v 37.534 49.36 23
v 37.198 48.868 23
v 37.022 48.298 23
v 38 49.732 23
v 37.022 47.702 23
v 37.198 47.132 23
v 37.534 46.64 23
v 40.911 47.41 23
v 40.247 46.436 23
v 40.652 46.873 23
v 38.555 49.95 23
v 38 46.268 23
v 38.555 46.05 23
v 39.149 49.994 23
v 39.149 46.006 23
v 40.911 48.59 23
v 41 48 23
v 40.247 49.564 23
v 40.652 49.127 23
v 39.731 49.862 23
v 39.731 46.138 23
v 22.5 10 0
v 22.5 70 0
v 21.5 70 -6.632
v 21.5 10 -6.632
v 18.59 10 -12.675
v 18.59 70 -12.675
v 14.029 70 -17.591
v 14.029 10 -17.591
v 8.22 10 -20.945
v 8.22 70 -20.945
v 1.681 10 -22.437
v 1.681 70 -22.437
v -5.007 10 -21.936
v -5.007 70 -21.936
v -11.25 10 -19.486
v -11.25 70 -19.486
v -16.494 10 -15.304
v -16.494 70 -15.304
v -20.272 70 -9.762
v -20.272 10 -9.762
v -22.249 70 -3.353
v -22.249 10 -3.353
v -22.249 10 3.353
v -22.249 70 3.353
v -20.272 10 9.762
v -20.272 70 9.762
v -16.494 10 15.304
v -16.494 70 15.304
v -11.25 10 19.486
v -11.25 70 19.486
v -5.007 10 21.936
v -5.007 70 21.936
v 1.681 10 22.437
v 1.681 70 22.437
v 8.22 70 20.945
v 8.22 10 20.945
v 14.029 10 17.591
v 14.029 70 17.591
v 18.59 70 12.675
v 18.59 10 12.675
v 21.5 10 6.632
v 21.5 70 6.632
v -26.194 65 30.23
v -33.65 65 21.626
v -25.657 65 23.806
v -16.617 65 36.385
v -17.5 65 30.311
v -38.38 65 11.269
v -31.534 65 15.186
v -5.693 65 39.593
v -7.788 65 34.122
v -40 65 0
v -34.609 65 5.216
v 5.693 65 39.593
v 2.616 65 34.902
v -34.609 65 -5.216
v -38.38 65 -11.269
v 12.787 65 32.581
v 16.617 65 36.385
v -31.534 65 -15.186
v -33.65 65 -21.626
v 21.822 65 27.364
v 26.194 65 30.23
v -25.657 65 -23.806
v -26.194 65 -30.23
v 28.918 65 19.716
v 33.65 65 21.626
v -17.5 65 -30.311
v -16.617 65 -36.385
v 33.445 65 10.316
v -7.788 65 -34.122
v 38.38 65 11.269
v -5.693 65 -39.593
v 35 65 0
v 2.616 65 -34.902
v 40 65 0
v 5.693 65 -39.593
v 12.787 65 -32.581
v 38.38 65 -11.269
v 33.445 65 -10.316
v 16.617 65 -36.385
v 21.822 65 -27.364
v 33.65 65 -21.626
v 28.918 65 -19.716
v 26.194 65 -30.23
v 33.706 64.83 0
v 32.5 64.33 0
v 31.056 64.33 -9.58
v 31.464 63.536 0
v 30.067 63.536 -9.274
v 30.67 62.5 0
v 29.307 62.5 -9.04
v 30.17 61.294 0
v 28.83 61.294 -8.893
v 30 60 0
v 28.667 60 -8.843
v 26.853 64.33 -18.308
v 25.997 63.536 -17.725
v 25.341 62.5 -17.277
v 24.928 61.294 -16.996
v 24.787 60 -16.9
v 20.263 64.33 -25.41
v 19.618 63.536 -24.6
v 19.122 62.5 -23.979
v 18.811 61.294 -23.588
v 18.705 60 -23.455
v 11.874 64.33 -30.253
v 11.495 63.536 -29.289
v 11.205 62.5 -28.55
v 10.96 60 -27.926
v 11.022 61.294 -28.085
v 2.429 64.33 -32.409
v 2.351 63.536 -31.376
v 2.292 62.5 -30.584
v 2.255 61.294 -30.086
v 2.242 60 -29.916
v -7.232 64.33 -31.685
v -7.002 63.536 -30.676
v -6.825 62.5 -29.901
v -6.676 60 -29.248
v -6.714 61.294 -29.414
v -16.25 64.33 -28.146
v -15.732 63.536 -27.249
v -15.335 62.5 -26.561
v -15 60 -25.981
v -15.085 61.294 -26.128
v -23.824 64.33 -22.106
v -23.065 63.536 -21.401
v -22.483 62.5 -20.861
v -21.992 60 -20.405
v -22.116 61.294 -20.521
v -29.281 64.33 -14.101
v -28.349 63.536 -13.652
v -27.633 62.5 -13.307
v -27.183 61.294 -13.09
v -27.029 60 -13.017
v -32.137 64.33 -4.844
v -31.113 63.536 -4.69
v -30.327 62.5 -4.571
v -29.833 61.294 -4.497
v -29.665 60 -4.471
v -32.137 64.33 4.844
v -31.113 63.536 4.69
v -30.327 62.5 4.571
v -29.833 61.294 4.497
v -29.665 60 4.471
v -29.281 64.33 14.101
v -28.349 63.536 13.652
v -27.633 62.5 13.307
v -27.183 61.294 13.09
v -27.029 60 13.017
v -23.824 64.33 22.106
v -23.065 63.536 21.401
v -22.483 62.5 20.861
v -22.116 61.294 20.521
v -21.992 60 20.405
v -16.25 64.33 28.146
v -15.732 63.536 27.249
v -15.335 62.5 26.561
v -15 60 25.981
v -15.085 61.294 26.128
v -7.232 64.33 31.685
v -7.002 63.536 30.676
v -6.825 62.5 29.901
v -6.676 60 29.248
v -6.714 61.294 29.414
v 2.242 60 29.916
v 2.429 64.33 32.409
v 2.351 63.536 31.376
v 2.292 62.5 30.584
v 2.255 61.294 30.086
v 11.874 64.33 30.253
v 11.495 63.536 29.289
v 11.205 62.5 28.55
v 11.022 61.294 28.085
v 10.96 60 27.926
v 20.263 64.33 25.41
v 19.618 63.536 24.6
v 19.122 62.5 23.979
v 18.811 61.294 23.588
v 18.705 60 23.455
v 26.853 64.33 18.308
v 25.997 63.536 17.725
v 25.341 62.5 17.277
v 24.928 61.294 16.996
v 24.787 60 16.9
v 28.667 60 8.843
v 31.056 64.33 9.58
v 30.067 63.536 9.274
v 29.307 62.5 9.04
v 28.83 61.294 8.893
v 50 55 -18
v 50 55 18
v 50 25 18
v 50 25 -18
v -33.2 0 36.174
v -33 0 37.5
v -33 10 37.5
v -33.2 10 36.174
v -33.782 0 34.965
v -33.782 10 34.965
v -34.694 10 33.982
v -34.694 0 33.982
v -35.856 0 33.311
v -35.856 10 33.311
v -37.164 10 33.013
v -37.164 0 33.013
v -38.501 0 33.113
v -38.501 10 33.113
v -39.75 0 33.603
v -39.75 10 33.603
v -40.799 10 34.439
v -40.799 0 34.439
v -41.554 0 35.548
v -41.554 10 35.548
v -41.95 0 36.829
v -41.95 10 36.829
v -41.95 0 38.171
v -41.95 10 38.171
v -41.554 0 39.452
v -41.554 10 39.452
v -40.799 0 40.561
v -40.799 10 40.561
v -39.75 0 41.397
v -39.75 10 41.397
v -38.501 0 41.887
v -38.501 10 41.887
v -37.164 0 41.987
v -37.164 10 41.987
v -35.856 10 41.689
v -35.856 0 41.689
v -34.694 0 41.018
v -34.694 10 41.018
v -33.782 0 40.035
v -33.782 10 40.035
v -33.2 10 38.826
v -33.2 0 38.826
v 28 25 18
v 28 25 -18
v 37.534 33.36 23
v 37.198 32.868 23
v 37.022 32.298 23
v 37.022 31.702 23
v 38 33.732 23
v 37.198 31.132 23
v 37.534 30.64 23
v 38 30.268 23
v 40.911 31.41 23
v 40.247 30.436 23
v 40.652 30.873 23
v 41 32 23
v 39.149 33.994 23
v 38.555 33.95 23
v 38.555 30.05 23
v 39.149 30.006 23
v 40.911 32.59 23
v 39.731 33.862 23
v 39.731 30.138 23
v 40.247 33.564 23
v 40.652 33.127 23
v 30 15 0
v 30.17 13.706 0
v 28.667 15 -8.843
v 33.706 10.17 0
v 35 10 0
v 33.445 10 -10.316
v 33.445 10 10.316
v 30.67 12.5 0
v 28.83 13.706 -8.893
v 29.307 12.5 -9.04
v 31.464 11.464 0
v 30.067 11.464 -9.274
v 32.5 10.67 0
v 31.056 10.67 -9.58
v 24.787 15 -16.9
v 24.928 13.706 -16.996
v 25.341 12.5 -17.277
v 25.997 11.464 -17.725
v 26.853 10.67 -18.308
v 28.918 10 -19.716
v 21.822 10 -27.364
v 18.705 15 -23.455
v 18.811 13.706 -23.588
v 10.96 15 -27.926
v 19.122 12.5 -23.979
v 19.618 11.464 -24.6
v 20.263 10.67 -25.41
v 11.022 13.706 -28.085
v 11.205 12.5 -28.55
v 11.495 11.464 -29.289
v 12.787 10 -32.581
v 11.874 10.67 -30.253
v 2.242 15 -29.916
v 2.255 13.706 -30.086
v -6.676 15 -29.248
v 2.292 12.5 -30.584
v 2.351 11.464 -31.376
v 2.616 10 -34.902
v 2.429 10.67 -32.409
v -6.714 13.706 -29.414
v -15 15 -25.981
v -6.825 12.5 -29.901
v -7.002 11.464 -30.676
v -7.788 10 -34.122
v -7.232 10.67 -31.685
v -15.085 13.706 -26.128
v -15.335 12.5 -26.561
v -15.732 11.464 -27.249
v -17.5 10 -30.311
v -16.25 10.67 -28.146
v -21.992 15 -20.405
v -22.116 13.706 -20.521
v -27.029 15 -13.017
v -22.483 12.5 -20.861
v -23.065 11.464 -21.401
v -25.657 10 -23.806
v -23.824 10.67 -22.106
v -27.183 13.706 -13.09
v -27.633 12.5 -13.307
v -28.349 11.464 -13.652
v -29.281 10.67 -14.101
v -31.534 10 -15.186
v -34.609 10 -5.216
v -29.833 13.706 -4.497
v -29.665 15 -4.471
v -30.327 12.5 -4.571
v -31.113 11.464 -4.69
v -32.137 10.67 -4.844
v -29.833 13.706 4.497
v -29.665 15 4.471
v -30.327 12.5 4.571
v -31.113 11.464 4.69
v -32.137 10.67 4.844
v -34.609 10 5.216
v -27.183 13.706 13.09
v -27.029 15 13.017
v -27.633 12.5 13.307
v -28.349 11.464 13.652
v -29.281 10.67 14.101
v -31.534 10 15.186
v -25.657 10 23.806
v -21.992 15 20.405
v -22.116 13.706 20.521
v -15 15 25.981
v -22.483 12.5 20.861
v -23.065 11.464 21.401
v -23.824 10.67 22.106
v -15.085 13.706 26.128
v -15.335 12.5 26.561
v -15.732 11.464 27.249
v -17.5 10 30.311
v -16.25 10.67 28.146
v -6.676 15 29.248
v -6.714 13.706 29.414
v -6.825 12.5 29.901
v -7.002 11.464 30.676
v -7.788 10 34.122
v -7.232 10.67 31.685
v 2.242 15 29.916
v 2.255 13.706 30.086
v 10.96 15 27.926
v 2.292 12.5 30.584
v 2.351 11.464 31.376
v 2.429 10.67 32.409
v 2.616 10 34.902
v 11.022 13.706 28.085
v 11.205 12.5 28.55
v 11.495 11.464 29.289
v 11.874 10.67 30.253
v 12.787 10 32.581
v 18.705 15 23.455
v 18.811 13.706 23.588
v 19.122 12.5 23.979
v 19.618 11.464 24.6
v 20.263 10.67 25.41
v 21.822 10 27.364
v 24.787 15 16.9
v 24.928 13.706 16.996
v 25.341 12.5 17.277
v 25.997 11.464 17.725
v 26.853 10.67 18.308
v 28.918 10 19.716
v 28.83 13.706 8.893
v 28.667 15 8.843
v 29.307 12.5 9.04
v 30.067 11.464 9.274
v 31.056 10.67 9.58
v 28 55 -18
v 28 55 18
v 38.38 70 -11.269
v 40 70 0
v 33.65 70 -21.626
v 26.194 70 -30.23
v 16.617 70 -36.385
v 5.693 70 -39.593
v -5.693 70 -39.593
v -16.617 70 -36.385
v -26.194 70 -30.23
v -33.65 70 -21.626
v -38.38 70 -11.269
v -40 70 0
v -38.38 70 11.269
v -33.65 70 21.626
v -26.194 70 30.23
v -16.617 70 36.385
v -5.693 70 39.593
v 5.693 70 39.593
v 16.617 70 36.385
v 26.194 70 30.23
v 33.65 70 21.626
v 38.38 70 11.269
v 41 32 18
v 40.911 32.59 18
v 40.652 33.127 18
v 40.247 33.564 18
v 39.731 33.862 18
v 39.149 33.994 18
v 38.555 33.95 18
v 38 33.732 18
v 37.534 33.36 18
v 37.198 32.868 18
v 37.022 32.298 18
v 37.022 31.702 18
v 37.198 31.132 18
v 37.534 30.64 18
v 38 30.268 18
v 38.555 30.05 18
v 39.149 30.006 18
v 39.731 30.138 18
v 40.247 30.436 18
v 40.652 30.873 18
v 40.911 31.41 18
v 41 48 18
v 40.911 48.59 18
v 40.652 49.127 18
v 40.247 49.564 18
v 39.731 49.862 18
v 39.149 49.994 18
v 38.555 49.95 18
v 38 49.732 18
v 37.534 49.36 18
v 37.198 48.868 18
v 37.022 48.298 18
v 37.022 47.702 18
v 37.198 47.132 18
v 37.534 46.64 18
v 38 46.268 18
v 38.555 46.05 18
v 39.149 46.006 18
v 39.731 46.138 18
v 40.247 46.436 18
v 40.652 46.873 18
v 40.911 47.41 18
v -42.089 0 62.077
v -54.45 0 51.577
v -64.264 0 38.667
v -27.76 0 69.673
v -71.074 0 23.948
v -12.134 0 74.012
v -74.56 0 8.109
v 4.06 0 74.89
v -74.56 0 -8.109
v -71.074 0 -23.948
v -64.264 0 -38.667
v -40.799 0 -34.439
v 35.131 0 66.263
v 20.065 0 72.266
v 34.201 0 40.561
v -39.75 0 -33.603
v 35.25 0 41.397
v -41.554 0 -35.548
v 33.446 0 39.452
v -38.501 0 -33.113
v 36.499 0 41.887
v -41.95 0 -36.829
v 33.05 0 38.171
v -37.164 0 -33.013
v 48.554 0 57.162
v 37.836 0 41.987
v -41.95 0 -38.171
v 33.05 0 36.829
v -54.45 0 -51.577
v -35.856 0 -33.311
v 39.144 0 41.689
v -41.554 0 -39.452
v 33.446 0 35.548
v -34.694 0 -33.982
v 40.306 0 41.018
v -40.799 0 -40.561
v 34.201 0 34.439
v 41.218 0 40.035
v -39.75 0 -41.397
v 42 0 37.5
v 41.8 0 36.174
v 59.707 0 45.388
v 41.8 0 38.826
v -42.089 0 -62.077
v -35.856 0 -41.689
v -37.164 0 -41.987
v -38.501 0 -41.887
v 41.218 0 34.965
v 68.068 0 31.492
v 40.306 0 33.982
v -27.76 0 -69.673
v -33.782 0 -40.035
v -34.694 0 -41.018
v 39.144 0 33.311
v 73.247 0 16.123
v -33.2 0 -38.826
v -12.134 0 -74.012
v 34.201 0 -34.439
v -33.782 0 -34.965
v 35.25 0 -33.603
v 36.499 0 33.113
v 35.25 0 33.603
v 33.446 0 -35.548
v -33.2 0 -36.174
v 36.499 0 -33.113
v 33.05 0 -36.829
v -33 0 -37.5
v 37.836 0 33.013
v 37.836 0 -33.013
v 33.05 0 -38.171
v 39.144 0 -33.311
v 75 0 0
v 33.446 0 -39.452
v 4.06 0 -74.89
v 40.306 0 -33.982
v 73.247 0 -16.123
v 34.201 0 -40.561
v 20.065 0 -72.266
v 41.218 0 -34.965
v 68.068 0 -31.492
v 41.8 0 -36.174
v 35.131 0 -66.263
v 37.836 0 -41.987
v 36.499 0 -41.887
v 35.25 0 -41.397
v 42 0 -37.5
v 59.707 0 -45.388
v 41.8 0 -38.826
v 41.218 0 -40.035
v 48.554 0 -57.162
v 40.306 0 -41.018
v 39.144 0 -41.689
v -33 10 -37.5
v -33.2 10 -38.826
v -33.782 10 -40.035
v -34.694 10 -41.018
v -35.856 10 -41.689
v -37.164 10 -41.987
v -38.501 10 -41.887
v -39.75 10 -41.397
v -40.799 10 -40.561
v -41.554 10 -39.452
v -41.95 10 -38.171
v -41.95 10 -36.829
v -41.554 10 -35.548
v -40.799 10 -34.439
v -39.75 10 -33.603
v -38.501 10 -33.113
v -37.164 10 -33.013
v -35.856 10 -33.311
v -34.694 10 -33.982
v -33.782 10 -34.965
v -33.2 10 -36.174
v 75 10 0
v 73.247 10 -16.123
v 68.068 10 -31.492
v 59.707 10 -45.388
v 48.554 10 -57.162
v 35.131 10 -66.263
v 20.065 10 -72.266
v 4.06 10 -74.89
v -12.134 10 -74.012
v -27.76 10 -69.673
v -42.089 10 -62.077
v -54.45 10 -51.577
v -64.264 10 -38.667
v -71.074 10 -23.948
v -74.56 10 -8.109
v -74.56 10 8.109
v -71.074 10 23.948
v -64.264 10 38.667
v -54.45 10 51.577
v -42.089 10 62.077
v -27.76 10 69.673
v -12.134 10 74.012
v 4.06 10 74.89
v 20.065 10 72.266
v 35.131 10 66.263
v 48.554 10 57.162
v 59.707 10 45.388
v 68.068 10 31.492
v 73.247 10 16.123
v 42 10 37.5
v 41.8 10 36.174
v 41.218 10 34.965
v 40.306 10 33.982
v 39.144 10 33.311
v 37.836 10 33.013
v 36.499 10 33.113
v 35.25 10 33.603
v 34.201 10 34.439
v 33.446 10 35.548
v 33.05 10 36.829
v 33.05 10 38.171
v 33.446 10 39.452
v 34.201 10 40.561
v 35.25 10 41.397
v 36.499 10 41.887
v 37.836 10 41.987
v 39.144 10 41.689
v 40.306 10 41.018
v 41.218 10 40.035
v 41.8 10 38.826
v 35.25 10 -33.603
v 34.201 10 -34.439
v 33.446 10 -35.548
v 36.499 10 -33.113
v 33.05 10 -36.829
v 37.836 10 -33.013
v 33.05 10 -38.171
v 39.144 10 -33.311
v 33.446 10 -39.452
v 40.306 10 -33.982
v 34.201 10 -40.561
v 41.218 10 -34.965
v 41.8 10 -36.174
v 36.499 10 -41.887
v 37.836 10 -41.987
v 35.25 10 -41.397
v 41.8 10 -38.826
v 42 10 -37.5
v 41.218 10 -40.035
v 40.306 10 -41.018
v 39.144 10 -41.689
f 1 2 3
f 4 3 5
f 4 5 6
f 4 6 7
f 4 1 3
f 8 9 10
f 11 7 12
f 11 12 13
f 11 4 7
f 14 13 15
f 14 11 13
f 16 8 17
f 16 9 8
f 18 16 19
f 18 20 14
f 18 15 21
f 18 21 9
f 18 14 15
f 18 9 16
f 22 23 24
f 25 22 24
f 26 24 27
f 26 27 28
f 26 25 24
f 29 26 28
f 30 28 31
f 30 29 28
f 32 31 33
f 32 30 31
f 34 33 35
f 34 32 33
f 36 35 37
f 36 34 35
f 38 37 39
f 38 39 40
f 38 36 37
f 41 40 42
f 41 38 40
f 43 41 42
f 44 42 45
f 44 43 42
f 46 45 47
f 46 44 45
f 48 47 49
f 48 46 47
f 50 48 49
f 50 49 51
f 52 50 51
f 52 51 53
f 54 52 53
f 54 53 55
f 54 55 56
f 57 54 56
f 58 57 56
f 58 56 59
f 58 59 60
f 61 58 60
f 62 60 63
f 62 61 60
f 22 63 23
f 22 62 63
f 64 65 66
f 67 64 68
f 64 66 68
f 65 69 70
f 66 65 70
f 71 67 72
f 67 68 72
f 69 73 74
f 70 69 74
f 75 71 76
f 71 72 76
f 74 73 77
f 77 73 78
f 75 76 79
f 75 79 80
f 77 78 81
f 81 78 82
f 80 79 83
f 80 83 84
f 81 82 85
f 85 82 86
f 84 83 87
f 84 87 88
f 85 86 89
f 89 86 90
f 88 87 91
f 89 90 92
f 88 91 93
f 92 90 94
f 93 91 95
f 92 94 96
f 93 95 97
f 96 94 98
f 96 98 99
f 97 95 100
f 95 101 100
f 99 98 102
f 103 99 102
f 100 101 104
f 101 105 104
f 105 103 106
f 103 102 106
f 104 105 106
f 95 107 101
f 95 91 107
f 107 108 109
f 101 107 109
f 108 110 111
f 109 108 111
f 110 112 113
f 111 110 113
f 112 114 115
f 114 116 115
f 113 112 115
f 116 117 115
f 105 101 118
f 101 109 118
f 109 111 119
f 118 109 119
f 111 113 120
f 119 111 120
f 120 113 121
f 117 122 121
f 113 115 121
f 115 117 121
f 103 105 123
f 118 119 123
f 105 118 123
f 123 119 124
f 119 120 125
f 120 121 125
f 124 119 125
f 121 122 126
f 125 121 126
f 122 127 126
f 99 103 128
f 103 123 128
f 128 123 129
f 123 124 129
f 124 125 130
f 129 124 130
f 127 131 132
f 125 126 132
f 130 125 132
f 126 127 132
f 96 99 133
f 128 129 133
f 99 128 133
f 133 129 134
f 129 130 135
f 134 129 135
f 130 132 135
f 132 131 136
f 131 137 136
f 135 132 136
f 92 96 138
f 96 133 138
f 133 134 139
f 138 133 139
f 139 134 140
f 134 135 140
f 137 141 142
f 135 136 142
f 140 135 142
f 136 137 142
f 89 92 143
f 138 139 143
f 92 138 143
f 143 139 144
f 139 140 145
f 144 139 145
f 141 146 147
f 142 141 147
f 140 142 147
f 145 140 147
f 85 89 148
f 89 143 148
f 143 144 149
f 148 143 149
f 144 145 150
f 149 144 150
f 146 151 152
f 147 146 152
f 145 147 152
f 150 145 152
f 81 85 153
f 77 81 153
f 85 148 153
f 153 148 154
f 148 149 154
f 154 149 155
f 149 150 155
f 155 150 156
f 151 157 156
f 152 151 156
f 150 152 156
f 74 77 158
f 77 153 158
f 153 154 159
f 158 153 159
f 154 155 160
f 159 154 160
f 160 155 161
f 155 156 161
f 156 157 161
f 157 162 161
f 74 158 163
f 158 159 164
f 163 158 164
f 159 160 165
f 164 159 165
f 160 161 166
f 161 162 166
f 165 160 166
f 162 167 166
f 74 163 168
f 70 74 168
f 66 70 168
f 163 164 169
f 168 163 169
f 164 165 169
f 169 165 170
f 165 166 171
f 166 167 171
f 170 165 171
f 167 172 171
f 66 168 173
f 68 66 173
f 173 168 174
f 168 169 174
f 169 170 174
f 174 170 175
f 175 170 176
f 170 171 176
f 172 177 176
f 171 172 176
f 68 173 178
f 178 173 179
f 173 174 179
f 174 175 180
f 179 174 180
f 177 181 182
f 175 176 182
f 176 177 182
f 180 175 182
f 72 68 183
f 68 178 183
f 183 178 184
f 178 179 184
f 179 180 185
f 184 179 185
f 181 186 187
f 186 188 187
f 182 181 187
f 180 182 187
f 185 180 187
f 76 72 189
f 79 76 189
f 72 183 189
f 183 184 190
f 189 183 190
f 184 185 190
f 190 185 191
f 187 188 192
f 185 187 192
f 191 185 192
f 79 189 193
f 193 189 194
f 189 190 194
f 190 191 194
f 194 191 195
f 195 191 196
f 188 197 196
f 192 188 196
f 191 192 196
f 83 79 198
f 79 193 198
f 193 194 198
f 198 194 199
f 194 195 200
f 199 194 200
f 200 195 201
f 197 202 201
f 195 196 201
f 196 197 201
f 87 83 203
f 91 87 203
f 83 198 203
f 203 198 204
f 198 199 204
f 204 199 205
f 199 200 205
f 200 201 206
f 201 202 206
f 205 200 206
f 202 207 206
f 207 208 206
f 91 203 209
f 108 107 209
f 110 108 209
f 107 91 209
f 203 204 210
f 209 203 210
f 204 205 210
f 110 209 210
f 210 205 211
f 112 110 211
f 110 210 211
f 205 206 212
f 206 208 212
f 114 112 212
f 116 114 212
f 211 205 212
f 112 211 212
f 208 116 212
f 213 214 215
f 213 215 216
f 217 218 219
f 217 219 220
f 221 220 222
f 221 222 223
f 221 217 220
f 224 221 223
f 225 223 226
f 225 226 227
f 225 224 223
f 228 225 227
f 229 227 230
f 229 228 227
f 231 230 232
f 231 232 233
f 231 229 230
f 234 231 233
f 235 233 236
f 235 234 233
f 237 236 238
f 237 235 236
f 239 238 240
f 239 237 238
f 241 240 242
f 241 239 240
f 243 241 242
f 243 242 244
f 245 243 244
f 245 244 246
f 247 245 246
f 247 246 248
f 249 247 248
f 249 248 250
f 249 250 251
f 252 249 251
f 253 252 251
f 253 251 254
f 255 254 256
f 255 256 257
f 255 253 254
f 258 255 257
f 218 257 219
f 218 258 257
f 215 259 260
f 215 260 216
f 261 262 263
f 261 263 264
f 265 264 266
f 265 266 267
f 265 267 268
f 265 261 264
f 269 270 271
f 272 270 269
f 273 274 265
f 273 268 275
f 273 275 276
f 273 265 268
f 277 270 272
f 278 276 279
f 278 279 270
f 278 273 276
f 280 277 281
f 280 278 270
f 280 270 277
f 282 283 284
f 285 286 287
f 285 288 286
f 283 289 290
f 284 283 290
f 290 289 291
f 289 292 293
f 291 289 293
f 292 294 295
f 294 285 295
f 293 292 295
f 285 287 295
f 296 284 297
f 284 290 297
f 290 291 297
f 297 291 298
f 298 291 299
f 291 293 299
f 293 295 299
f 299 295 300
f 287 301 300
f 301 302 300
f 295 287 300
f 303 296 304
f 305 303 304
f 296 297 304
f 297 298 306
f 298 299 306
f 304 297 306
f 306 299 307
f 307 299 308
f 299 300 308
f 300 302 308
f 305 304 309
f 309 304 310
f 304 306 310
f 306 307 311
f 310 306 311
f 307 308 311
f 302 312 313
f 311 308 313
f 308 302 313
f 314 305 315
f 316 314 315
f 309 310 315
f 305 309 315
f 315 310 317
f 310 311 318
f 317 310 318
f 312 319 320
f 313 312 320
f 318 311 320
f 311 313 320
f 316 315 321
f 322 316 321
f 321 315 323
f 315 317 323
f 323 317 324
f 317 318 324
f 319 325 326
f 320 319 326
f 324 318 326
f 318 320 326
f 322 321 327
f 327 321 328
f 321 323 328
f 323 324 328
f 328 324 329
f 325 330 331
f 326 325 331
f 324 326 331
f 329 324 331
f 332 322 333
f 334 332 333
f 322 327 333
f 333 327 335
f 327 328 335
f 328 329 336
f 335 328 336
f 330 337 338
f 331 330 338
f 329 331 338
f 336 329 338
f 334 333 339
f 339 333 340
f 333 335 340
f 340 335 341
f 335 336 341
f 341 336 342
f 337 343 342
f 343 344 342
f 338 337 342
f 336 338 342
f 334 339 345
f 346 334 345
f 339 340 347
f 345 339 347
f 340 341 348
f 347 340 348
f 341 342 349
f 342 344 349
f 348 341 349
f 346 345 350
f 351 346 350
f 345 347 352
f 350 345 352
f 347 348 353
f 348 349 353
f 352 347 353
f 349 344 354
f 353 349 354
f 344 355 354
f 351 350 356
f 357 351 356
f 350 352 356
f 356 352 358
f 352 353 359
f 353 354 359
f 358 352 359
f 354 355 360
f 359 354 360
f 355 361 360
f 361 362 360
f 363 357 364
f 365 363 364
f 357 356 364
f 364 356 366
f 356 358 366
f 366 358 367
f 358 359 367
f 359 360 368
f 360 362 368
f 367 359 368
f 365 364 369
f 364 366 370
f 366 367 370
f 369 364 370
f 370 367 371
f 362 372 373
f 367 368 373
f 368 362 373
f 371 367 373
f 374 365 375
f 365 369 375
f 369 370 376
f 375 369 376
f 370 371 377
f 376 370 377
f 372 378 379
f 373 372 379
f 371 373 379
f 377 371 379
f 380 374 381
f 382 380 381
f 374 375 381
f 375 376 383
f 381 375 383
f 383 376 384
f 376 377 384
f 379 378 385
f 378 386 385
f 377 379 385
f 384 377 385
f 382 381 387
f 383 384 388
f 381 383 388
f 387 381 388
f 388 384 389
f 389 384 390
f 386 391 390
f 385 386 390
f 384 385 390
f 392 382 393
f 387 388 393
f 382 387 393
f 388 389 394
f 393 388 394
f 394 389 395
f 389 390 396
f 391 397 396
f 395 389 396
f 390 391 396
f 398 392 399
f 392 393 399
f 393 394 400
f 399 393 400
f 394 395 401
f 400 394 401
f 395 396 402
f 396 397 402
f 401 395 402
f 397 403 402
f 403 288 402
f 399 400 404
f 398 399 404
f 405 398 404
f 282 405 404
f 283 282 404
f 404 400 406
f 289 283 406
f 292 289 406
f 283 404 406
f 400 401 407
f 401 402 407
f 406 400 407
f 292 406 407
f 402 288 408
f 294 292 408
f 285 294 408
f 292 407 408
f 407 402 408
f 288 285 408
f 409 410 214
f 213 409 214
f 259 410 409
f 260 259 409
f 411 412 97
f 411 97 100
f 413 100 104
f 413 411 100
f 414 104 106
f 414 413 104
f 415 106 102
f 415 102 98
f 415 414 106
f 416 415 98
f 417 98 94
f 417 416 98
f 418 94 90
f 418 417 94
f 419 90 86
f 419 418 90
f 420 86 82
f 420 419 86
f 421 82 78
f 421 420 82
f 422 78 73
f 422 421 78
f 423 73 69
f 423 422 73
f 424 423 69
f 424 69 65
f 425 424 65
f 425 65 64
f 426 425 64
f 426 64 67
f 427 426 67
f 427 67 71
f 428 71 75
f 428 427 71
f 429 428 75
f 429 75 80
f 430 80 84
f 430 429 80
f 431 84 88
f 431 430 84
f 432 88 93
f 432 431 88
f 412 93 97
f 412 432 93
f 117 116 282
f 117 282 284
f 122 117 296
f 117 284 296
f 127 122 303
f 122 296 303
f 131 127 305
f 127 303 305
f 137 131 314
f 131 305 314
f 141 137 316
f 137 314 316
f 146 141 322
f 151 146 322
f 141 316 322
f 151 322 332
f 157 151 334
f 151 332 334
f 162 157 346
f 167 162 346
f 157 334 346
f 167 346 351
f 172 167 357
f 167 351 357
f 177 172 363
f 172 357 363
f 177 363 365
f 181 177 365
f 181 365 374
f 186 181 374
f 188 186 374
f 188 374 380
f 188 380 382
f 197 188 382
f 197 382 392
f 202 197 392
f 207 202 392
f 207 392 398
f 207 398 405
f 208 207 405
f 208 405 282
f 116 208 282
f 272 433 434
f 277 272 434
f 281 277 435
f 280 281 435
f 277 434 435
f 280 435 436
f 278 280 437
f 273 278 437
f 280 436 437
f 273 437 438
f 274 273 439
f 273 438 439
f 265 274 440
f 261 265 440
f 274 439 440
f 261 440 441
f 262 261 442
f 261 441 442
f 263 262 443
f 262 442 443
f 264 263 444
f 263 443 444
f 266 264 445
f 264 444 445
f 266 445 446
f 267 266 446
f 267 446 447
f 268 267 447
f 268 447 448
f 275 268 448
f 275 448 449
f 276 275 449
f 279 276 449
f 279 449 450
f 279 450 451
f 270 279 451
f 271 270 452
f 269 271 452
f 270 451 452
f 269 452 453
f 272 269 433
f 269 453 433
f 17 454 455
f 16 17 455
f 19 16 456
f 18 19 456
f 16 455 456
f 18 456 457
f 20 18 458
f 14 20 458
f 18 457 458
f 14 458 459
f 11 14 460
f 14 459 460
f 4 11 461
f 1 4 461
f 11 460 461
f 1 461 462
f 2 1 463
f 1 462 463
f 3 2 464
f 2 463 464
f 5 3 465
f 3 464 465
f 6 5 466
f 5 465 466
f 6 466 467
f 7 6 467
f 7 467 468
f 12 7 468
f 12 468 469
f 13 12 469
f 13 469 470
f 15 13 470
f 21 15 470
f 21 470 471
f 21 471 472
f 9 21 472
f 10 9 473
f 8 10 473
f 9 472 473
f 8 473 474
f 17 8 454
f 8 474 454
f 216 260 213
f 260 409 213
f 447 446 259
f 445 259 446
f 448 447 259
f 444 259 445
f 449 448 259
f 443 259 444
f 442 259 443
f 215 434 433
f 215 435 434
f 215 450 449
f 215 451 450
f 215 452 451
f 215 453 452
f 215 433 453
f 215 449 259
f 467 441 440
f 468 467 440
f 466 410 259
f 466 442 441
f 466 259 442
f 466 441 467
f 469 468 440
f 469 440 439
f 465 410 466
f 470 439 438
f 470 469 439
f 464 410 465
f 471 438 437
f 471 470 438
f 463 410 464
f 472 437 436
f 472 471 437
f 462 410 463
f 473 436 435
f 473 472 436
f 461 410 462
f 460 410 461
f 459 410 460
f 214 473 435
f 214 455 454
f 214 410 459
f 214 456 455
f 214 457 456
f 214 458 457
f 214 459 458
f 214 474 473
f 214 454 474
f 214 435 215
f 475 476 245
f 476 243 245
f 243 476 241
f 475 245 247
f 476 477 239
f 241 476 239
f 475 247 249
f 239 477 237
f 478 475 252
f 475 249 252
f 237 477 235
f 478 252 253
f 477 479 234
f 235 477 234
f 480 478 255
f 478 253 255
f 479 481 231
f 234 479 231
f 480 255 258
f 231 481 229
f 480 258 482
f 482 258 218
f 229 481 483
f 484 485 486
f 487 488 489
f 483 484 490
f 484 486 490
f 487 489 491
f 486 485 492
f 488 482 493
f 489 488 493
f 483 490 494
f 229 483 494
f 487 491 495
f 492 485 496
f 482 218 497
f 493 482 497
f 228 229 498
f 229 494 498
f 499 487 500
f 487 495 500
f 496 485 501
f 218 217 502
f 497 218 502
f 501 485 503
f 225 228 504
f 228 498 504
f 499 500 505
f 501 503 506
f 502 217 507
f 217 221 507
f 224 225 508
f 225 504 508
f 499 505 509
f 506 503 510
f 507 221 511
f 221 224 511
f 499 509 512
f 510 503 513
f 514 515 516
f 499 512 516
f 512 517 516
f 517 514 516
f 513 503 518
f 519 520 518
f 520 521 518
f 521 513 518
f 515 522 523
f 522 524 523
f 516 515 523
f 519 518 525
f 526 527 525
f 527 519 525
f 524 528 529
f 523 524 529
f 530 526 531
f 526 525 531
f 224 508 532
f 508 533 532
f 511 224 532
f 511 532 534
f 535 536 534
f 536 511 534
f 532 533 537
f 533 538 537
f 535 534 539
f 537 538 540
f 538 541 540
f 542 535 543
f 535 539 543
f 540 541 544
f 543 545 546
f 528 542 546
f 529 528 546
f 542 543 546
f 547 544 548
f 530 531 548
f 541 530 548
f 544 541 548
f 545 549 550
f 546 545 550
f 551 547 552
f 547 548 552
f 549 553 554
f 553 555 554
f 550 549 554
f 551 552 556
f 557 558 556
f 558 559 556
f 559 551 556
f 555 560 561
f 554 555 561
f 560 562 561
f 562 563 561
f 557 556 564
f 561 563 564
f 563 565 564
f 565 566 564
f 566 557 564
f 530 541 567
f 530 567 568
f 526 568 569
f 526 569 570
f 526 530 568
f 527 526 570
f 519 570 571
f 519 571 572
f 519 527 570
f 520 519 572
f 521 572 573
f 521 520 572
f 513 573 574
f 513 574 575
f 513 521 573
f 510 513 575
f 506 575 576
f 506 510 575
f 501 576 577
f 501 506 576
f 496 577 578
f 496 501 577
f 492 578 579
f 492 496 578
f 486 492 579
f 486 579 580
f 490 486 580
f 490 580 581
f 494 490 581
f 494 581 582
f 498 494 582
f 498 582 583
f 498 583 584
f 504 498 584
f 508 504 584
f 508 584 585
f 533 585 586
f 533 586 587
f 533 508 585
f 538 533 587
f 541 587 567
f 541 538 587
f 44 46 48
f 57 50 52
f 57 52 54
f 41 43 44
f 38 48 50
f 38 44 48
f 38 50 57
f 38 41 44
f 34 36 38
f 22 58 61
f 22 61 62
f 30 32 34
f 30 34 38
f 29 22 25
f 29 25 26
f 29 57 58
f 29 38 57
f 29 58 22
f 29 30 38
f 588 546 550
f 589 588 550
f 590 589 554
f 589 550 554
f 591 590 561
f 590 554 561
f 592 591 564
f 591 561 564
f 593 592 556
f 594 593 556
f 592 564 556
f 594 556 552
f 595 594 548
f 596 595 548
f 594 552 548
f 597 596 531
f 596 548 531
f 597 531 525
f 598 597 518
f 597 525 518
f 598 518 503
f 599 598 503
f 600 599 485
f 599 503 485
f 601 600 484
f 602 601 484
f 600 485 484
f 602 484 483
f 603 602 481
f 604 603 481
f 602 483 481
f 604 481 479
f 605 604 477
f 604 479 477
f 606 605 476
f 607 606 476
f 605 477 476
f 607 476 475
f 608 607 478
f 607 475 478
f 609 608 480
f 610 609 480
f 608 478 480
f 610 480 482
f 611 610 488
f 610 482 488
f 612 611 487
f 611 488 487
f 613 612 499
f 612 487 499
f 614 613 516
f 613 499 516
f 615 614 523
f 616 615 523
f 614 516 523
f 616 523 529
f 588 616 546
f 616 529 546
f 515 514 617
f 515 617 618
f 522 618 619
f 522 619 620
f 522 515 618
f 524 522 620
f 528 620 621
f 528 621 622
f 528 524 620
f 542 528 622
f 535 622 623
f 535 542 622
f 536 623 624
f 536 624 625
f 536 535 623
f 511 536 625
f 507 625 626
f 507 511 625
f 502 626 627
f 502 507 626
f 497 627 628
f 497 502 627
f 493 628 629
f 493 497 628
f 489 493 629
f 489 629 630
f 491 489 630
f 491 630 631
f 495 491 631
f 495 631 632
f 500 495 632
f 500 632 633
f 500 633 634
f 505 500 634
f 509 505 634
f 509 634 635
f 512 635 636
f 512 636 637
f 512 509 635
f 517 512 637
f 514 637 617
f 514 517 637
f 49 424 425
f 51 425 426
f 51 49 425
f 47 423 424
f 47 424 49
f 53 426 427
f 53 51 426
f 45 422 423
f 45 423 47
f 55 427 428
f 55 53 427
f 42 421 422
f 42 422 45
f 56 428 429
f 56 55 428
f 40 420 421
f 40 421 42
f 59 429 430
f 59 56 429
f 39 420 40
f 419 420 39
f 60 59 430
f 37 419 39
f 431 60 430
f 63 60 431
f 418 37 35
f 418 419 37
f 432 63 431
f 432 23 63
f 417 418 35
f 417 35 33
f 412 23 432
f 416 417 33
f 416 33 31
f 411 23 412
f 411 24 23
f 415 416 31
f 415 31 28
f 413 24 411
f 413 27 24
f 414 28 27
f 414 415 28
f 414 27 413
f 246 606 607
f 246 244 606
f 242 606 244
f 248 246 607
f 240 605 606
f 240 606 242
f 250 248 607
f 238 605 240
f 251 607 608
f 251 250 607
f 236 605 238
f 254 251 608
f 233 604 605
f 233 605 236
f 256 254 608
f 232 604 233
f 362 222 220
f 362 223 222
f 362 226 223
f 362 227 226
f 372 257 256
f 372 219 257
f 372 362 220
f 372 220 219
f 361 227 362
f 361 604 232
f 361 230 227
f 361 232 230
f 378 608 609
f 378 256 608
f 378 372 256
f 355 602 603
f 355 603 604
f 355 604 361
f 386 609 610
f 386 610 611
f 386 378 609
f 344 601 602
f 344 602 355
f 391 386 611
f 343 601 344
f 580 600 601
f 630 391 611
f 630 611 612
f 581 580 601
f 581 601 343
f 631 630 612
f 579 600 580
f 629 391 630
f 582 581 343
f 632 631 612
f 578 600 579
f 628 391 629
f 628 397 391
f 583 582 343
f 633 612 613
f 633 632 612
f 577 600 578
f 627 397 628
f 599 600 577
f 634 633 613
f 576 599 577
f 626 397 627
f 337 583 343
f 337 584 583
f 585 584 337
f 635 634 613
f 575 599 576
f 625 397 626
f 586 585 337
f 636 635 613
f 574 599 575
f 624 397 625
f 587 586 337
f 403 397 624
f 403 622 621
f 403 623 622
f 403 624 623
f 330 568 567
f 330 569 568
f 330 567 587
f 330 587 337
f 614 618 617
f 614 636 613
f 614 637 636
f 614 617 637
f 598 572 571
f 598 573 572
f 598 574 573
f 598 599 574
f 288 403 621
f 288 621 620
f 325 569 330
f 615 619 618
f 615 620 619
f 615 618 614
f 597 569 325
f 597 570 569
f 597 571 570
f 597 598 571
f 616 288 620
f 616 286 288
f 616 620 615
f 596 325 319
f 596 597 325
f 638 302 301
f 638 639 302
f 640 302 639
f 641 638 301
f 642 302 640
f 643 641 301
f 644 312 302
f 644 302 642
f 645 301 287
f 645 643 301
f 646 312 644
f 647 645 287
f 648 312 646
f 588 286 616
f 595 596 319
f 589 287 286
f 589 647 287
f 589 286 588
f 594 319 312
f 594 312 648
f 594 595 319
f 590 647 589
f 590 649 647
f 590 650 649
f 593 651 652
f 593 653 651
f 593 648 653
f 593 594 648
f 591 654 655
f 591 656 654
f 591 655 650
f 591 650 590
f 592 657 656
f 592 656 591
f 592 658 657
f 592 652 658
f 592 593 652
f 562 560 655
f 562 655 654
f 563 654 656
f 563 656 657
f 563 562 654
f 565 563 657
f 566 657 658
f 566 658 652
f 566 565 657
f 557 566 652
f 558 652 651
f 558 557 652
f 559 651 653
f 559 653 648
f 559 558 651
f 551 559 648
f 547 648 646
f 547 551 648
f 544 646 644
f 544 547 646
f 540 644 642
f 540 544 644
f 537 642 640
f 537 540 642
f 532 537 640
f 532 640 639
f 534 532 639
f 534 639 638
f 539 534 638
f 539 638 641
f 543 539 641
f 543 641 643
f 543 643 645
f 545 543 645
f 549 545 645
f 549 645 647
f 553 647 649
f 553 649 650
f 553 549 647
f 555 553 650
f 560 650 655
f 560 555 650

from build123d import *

# Parameters (mm, degrees)
IZIM1_W                     = 100
IZIM1_H                     = 100
IZIM1_R                     = 4.5
Y_KSEKLIK_EKSTR_ZYON1_DEPTH = 10
IZIM3_R                     = 30
IZIM3_R_2                   = 22.5
Y_KSEKLIK_EKSTR_ZYON2_DEPTH = 60
IZIM4_R                     = 40
IZIM4_R_2                   = 30
Y_KSEKLIK_EKSTR_ZYON3_DEPTH = 5
RADYUS1_R                   = 5
Y_KSEKLIK_EKSTR_ZYON4_START = 40
IZIM5_W                     = 22
IZIM5_H                     = 36
Y_KSEKLIK_EKSTR_ZYON4_DEPTH = 15
IZIM6_R                     = 2
Y_KSEKLIK_EKSTR_ZYON5_DEPTH = 5
IZIM7_R                     = 75
Y_KSEKLIK_EKSTR_ZYON6_DEPTH = 10


with BuildPart() as part:
    # Çizim1 → Yükseklik-Ekstrüzyon1 (new body)
    with BuildSketch(Plane(origin=(0, 0, 0), x_dir=(1, 0, 0), z_dir=(0, 1, 0))):
        Rectangle(IZIM1_W, IZIM1_H)
        with Locations((-37.5, 37.5)):
            Circle(IZIM1_R, mode=Mode.SUBTRACT)
        with Locations((37.5, 37.5)):
            Circle(IZIM1_R, mode=Mode.SUBTRACT)
        with Locations((37.5, -37.5)):
            Circle(IZIM1_R, mode=Mode.SUBTRACT)
        with Locations((-37.5, -37.5)):
            Circle(IZIM1_R, mode=Mode.SUBTRACT)
    extrude(amount=Y_KSEKLIK_EKSTR_ZYON1_DEPTH)

    # Çizim3 → Yükseklik-Ekstrüzyon2 (add)
    with BuildSketch(Plane(origin=(0, 10, 0), x_dir=(1, 0, 0), z_dir=(0, 1, 0))):
        Circle(IZIM3_R)
        Circle(IZIM3_R_2, mode=Mode.SUBTRACT)
    extrude(amount=Y_KSEKLIK_EKSTR_ZYON2_DEPTH)

    # Çizim4 → Yükseklik-Ekstrüzyon3 (add)
    with BuildSketch(Plane(origin=(0, 70, 0), x_dir=(1, 0, 0), z_dir=(0, 1, 0))):
        Circle(IZIM4_R)
        Circle(IZIM4_R_2, mode=Mode.SUBTRACT)
    extrude(amount=-Y_KSEKLIK_EKSTR_ZYON3_DEPTH)

    # Radyus1
    radyus1_edges = [part.edges().sort_by_distance(p)[0] for p in [
        (-30, 10, 0),
        (-30, 65, 0),
        (50, 5, 50),
        (-50, 5, 50),
        (-50, 5, -50),
        (50, 5, -50),
    ]]
    fillet(radyus1_edges, radius=RADYUS1_R)

    # Çizim7 → Yükseklik-Ekstrüzyon6 (add)
    with BuildSketch(Plane(origin=(0, 0, 0), x_dir=(1, 0, 0), z_dir=(0, 1, 0))):
        Circle(IZIM7_R)
        with BuildLine():
            Line((45, 50), (-45, 50))
            ThreePointArc((-45, 50), (-48.535533906, 48.535533906), (-50, 45))
            Line((-50, 45), (-50, -45))
            ThreePointArc((-50, -45), (-48.535533906, -48.535533906), (-45, -50))
            Line((-45, -50), (45, -50))
            ThreePointArc((45, -50), (48.535533906, -48.535533906), (50, -45))
            Line((50, -45), (50, 45))
            ThreePointArc((50, 45), (48.535533906, 48.535533906), (45, 50))
        make_face(mode=Mode.SUBTRACT)
    extrude(amount=Y_KSEKLIK_EKSTR_ZYON6_DEPTH)


with BuildPart() as body_2:
    # Çizim5 → Yükseklik-Ekstrüzyon4 (new body, symmetric)
    with BuildSketch(Plane(origin=(0, 0, 0), x_dir=(1, 0, 0), z_dir=(0, 1, 0)).offset(Y_KSEKLIK_EKSTR_ZYON4_START)):
        with Locations((39, 0)):
            Rectangle(IZIM5_W, IZIM5_H)
    extrude(amount=Y_KSEKLIK_EKSTR_ZYON4_DEPTH, both=True)

    # Çizim6 → Yükseklik-Ekstrüzyon5 (add)
    with BuildSketch(Plane.XY.offset(18)):
        with Locations((39, 48)):
            Circle(IZIM6_R)
        with Locations((39, 32)):
            Circle(IZIM6_R)
    extrude(amount=Y_KSEKLIK_EKSTR_ZYON5_DEPTH)


solid = Compound([part.part, body_2.part])
